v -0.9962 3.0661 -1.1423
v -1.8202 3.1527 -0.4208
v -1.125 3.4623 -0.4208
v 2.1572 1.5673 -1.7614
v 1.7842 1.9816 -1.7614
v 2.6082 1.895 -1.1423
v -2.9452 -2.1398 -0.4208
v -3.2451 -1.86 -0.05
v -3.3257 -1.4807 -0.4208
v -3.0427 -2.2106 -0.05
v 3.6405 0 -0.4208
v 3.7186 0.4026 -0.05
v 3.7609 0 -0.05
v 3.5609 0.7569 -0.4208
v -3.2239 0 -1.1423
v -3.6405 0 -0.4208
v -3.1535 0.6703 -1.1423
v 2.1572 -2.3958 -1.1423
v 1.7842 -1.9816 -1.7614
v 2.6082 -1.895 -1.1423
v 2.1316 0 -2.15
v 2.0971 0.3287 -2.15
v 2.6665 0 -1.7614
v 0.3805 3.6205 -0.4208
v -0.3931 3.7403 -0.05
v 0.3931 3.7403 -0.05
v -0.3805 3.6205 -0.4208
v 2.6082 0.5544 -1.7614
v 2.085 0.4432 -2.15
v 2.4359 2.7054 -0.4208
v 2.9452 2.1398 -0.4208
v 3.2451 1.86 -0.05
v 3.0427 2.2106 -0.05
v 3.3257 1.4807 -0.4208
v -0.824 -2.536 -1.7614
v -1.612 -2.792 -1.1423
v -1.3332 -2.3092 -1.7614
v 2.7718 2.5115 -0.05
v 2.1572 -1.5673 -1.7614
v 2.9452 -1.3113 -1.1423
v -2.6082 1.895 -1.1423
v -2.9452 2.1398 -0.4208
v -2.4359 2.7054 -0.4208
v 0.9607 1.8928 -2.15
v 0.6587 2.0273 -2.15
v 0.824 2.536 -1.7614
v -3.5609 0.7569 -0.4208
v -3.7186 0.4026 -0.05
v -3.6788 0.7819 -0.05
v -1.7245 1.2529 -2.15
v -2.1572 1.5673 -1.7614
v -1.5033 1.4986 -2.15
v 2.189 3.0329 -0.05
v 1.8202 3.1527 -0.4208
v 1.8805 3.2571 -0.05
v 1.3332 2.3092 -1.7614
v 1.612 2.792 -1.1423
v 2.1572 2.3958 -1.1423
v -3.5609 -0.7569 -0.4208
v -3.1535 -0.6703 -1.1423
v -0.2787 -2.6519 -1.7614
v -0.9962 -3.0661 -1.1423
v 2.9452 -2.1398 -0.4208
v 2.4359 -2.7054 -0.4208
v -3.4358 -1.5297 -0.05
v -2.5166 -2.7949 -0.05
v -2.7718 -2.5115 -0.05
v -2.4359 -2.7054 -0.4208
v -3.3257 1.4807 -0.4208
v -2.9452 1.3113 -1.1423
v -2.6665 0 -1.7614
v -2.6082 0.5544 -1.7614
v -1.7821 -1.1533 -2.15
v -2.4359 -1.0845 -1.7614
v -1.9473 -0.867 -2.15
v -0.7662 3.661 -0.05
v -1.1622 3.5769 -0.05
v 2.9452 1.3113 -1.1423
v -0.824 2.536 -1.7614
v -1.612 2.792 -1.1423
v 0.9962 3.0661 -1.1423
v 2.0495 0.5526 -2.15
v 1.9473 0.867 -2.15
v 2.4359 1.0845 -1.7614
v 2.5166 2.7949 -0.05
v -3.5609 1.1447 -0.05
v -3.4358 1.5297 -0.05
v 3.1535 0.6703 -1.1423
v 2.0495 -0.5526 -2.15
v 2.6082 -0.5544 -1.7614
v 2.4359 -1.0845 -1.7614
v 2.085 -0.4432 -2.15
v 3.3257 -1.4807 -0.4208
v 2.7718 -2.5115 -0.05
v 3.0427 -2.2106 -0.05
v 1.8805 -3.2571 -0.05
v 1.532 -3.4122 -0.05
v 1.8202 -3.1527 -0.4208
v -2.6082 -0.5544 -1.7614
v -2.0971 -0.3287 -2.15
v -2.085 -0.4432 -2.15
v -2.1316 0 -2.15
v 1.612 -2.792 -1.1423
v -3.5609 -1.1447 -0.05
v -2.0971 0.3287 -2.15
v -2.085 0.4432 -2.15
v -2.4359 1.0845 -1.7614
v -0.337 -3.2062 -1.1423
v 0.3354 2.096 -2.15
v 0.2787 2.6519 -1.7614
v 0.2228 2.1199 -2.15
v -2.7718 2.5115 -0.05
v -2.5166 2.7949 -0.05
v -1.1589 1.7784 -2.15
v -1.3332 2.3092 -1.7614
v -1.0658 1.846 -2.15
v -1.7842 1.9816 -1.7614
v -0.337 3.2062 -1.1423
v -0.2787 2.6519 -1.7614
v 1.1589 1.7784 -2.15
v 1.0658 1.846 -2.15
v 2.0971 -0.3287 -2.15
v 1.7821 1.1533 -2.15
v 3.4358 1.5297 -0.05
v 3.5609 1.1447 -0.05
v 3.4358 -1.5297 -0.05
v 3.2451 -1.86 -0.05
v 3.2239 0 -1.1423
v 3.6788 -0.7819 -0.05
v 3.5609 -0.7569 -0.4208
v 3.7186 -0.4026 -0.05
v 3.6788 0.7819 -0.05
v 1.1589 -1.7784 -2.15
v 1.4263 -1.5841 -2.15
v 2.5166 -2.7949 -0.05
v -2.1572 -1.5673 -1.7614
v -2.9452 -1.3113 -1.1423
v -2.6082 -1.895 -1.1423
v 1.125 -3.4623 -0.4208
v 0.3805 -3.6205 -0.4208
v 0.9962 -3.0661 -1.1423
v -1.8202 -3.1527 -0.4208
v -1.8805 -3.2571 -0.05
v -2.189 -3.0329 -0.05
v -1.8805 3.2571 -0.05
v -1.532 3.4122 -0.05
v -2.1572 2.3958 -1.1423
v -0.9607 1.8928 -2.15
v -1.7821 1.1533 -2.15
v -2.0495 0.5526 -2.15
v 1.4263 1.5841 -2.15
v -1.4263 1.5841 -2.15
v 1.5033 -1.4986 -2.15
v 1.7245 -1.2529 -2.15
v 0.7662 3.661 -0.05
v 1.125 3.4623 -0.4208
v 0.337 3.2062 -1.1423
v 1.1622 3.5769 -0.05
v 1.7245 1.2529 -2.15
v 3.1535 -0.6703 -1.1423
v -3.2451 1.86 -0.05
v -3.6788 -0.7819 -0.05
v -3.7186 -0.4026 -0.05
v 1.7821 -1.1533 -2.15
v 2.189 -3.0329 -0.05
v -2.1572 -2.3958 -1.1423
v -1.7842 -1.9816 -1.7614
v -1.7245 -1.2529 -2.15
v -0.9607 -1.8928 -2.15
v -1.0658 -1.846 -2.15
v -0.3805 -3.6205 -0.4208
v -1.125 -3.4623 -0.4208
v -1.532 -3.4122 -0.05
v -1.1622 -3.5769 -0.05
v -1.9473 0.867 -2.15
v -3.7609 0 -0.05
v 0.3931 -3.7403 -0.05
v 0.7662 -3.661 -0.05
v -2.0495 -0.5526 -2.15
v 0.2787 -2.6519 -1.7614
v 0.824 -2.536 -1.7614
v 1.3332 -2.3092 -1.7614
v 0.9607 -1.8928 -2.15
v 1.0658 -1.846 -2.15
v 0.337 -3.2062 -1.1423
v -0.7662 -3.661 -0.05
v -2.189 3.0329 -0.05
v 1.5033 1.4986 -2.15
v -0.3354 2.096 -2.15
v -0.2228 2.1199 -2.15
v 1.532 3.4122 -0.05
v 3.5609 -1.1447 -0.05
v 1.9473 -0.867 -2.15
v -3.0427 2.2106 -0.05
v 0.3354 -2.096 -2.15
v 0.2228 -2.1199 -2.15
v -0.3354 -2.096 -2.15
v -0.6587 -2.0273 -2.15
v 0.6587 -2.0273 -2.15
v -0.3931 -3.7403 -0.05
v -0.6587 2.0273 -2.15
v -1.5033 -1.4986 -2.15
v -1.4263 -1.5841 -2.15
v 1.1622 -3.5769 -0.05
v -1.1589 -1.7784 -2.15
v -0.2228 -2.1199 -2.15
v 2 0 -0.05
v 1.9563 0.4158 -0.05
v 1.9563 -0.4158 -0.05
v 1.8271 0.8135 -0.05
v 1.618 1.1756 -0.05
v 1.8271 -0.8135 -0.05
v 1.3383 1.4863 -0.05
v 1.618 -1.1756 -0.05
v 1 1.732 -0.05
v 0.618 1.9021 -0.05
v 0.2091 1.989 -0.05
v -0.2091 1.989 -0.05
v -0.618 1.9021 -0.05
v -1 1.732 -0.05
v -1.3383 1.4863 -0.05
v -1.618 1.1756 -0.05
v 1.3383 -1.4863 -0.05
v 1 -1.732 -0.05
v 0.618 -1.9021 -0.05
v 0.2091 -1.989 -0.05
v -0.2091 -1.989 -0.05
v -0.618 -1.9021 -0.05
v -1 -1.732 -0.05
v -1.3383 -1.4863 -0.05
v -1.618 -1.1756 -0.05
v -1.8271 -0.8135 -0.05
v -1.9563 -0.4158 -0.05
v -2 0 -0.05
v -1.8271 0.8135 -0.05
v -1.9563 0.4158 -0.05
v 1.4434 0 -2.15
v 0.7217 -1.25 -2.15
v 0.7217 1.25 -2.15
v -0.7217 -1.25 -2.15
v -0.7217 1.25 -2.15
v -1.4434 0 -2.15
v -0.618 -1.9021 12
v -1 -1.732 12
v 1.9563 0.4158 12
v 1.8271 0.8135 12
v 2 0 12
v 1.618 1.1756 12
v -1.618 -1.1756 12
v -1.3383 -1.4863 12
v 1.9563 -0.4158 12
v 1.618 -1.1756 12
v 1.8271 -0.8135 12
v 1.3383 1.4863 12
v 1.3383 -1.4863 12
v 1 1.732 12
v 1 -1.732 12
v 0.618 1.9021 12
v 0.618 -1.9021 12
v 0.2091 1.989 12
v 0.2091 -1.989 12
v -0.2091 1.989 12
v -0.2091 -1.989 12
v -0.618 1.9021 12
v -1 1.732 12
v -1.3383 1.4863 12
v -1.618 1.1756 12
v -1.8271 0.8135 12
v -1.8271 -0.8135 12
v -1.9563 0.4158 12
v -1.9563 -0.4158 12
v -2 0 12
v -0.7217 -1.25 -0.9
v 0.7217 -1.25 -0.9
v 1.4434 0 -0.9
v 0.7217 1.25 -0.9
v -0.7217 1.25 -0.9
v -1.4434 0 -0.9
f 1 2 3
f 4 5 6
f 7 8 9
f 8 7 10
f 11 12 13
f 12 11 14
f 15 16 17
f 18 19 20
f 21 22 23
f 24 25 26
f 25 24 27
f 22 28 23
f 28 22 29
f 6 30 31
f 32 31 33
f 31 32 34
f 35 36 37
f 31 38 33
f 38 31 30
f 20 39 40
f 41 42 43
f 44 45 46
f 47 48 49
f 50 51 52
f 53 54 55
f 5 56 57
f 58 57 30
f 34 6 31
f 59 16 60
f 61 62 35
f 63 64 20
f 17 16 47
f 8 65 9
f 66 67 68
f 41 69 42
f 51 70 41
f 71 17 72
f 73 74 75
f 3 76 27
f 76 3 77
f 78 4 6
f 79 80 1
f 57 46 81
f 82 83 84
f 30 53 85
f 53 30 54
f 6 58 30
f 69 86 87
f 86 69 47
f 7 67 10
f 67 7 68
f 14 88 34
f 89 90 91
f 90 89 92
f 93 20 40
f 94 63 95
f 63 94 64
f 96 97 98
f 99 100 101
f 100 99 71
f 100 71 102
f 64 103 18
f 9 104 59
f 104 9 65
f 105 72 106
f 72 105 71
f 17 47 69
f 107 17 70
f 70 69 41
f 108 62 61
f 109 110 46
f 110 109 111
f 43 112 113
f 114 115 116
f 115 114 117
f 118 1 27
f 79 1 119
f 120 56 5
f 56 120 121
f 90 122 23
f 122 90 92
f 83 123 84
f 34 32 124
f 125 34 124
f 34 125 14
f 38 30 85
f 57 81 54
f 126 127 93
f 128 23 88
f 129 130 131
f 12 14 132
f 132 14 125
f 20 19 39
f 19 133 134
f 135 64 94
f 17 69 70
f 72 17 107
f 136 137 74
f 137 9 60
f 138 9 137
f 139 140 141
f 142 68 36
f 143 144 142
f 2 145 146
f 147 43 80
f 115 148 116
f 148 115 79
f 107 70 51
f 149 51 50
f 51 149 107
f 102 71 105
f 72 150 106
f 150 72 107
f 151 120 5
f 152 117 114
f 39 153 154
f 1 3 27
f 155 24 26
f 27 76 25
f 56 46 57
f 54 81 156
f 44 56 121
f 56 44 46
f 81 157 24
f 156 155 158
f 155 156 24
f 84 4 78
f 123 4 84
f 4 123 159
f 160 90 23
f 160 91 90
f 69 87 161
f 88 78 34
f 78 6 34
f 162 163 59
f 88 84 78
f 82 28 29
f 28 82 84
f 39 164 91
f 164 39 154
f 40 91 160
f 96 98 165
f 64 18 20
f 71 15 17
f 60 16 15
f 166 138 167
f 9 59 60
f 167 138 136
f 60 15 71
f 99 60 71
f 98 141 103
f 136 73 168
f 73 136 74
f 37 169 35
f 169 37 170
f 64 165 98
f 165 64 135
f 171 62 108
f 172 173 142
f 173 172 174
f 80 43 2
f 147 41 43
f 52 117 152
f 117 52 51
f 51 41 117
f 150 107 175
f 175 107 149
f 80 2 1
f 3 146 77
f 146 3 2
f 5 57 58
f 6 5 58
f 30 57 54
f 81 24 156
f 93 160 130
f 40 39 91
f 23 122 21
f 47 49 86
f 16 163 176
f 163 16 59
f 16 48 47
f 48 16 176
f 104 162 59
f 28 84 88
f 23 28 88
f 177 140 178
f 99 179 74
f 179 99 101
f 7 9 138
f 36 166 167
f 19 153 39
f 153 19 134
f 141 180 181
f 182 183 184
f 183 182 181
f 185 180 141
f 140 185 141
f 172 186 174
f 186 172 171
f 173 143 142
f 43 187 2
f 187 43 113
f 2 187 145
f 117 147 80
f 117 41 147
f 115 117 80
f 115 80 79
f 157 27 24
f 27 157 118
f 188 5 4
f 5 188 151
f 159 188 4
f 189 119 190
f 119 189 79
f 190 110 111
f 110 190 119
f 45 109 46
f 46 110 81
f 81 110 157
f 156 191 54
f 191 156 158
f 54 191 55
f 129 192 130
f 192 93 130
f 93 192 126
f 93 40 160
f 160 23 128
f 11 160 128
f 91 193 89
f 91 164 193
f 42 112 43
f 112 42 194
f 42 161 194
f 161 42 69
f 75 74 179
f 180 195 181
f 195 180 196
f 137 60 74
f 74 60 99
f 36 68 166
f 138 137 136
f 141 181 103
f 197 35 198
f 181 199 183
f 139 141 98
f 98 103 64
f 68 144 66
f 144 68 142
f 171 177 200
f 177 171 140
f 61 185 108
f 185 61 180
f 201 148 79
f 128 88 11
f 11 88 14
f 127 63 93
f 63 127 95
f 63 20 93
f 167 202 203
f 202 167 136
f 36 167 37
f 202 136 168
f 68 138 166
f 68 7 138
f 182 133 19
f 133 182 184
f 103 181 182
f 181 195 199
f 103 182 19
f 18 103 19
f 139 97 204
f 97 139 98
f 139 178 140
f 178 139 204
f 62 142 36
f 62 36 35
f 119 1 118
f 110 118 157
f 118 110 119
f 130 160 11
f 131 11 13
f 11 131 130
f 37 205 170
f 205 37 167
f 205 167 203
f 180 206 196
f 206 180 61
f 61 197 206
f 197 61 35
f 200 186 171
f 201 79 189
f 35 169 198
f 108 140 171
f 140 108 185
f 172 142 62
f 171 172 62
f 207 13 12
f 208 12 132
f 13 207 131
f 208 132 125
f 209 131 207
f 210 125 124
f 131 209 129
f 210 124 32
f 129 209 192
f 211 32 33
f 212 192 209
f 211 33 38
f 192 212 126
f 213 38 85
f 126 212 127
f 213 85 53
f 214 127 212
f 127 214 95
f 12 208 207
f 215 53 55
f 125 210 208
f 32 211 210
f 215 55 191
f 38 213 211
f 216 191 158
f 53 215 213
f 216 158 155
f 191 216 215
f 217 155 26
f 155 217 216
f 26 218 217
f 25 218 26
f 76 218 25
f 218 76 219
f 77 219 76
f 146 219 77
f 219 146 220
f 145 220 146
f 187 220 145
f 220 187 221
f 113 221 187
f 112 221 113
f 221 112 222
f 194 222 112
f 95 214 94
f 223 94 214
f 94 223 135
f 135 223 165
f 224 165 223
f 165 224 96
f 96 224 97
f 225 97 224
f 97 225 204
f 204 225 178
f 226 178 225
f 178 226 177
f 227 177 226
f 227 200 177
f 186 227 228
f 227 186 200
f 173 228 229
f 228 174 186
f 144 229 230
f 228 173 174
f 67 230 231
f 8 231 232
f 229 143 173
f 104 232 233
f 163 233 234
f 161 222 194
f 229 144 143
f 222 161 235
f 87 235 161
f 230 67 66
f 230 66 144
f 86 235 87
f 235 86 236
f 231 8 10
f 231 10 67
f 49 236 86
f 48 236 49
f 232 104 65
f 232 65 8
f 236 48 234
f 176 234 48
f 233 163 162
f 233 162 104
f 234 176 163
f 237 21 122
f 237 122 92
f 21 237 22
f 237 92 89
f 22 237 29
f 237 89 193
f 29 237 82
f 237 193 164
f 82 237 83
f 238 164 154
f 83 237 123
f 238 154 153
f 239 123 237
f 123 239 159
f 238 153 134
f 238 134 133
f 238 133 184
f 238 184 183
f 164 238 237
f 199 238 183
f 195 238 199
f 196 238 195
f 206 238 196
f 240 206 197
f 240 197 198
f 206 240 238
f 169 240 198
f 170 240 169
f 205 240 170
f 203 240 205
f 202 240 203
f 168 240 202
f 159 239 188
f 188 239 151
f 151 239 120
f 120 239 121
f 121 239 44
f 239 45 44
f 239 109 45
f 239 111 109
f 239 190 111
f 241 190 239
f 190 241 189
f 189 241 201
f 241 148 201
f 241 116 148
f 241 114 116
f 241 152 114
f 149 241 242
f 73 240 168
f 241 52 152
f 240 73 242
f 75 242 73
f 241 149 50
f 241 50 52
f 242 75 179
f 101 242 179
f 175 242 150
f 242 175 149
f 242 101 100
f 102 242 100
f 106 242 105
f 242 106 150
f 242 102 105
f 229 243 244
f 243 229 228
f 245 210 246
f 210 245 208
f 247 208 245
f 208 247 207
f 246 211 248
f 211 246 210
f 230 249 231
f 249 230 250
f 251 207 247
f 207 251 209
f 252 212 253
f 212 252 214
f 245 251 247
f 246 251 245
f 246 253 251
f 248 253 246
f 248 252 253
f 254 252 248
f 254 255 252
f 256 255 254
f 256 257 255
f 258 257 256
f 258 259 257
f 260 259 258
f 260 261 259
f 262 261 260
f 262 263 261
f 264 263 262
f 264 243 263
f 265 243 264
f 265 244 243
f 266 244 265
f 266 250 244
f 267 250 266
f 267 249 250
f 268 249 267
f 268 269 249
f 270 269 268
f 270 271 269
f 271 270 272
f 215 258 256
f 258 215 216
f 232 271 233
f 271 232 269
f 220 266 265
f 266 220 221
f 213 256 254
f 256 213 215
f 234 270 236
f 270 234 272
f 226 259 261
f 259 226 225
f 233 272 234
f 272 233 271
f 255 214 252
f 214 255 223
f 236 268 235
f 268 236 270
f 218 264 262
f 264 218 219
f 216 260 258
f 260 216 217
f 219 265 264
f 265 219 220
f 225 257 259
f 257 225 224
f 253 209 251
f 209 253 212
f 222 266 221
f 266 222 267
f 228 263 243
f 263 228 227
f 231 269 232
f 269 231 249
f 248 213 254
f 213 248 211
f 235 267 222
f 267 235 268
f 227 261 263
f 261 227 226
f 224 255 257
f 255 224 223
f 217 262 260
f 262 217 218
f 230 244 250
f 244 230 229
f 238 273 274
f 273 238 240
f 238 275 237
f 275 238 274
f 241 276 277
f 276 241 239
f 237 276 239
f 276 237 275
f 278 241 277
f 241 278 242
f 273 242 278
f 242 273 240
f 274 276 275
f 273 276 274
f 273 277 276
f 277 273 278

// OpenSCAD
/*
   Copyright 2018 Scott Bezek and the splitflap contributors

   Licensed under the Apache License, Version 2.0 (the "License");
   you may not use this file except in compliance with the License.
   You may obtain a copy of the License at

       http://www.apache.org/licenses/LICENSE-2.0

   Unless required by applicable law or agreed to in writing, software
   distributed under the License is distributed on an "AS IS" BASIS,
   WITHOUT WARRANTIES OR CONDITIONS OF ANY KIND, either express or implied.
   See the License for the specific language governing permissions and
   limitations under the License.
*/

module roughM4_7380(length) {
    eps = 0.1;
    thread_diameter = 4;
    head_diameter = 7.6;
    head_length = 2.2;
    driving_depth = 1.3;
    driving_apothem = 2.5/2;
    driving_radius = driving_apothem / cos(180/6);

    sphere_offset = 1.2;  // Just a guess
    sphere_radius = sqrt(sphere_offset*sphere_offset + (head_diameter/2)*(head_diameter/2));


    difference() {
        union() {
            translate([0, 0, -eps]) {
                cylinder(h=length+eps, d=thread_diameter, $fn=30);
            }
            difference() {
                translate([0, 0, sphere_offset]) {
                    sphere(sphere_radius, $fn=30);
                }
                translate([0, 0, sphere_radius]) {
                    cube([sphere_radius*2 + eps, sphere_radius*2 + eps, sphere_radius*2 + eps], center=true);
                }
                translate([0, 0, -sphere_radius - head_length]) {
                    cube([sphere_radius*2 + eps, sphere_radius*2 + eps, sphere_radius*2 + eps], center=true);
                }
            }
        }
        translate([0, 0, -head_length-eps]) {
            cylinder(h=driving_depth+eps, r=driving_radius, $fn=6);
        }
    }
}

roughM4_7380(12);

        module color_selector(c) {
            precision = 0.0000001;  // arbitrary
            function compare_floats(x, y, i=0) = 
                  (len(x) != len(y)) ? false  // if arrays differ in length, they can't be equal
                : (i >= len(x)) ? true  // if we've hit the end of the arrays without issue, we're equal
                : (x[i] - precision <= y[i]) && x[i] + precision >= y[i]
                    ? compare_floats(x, y, i+1)
                    : false;  // not equal, short circuit

            if (c == [0, 0.5, 0] || compare_floats(c, [0, 0.5, 0]))
                children();
        }
                    
